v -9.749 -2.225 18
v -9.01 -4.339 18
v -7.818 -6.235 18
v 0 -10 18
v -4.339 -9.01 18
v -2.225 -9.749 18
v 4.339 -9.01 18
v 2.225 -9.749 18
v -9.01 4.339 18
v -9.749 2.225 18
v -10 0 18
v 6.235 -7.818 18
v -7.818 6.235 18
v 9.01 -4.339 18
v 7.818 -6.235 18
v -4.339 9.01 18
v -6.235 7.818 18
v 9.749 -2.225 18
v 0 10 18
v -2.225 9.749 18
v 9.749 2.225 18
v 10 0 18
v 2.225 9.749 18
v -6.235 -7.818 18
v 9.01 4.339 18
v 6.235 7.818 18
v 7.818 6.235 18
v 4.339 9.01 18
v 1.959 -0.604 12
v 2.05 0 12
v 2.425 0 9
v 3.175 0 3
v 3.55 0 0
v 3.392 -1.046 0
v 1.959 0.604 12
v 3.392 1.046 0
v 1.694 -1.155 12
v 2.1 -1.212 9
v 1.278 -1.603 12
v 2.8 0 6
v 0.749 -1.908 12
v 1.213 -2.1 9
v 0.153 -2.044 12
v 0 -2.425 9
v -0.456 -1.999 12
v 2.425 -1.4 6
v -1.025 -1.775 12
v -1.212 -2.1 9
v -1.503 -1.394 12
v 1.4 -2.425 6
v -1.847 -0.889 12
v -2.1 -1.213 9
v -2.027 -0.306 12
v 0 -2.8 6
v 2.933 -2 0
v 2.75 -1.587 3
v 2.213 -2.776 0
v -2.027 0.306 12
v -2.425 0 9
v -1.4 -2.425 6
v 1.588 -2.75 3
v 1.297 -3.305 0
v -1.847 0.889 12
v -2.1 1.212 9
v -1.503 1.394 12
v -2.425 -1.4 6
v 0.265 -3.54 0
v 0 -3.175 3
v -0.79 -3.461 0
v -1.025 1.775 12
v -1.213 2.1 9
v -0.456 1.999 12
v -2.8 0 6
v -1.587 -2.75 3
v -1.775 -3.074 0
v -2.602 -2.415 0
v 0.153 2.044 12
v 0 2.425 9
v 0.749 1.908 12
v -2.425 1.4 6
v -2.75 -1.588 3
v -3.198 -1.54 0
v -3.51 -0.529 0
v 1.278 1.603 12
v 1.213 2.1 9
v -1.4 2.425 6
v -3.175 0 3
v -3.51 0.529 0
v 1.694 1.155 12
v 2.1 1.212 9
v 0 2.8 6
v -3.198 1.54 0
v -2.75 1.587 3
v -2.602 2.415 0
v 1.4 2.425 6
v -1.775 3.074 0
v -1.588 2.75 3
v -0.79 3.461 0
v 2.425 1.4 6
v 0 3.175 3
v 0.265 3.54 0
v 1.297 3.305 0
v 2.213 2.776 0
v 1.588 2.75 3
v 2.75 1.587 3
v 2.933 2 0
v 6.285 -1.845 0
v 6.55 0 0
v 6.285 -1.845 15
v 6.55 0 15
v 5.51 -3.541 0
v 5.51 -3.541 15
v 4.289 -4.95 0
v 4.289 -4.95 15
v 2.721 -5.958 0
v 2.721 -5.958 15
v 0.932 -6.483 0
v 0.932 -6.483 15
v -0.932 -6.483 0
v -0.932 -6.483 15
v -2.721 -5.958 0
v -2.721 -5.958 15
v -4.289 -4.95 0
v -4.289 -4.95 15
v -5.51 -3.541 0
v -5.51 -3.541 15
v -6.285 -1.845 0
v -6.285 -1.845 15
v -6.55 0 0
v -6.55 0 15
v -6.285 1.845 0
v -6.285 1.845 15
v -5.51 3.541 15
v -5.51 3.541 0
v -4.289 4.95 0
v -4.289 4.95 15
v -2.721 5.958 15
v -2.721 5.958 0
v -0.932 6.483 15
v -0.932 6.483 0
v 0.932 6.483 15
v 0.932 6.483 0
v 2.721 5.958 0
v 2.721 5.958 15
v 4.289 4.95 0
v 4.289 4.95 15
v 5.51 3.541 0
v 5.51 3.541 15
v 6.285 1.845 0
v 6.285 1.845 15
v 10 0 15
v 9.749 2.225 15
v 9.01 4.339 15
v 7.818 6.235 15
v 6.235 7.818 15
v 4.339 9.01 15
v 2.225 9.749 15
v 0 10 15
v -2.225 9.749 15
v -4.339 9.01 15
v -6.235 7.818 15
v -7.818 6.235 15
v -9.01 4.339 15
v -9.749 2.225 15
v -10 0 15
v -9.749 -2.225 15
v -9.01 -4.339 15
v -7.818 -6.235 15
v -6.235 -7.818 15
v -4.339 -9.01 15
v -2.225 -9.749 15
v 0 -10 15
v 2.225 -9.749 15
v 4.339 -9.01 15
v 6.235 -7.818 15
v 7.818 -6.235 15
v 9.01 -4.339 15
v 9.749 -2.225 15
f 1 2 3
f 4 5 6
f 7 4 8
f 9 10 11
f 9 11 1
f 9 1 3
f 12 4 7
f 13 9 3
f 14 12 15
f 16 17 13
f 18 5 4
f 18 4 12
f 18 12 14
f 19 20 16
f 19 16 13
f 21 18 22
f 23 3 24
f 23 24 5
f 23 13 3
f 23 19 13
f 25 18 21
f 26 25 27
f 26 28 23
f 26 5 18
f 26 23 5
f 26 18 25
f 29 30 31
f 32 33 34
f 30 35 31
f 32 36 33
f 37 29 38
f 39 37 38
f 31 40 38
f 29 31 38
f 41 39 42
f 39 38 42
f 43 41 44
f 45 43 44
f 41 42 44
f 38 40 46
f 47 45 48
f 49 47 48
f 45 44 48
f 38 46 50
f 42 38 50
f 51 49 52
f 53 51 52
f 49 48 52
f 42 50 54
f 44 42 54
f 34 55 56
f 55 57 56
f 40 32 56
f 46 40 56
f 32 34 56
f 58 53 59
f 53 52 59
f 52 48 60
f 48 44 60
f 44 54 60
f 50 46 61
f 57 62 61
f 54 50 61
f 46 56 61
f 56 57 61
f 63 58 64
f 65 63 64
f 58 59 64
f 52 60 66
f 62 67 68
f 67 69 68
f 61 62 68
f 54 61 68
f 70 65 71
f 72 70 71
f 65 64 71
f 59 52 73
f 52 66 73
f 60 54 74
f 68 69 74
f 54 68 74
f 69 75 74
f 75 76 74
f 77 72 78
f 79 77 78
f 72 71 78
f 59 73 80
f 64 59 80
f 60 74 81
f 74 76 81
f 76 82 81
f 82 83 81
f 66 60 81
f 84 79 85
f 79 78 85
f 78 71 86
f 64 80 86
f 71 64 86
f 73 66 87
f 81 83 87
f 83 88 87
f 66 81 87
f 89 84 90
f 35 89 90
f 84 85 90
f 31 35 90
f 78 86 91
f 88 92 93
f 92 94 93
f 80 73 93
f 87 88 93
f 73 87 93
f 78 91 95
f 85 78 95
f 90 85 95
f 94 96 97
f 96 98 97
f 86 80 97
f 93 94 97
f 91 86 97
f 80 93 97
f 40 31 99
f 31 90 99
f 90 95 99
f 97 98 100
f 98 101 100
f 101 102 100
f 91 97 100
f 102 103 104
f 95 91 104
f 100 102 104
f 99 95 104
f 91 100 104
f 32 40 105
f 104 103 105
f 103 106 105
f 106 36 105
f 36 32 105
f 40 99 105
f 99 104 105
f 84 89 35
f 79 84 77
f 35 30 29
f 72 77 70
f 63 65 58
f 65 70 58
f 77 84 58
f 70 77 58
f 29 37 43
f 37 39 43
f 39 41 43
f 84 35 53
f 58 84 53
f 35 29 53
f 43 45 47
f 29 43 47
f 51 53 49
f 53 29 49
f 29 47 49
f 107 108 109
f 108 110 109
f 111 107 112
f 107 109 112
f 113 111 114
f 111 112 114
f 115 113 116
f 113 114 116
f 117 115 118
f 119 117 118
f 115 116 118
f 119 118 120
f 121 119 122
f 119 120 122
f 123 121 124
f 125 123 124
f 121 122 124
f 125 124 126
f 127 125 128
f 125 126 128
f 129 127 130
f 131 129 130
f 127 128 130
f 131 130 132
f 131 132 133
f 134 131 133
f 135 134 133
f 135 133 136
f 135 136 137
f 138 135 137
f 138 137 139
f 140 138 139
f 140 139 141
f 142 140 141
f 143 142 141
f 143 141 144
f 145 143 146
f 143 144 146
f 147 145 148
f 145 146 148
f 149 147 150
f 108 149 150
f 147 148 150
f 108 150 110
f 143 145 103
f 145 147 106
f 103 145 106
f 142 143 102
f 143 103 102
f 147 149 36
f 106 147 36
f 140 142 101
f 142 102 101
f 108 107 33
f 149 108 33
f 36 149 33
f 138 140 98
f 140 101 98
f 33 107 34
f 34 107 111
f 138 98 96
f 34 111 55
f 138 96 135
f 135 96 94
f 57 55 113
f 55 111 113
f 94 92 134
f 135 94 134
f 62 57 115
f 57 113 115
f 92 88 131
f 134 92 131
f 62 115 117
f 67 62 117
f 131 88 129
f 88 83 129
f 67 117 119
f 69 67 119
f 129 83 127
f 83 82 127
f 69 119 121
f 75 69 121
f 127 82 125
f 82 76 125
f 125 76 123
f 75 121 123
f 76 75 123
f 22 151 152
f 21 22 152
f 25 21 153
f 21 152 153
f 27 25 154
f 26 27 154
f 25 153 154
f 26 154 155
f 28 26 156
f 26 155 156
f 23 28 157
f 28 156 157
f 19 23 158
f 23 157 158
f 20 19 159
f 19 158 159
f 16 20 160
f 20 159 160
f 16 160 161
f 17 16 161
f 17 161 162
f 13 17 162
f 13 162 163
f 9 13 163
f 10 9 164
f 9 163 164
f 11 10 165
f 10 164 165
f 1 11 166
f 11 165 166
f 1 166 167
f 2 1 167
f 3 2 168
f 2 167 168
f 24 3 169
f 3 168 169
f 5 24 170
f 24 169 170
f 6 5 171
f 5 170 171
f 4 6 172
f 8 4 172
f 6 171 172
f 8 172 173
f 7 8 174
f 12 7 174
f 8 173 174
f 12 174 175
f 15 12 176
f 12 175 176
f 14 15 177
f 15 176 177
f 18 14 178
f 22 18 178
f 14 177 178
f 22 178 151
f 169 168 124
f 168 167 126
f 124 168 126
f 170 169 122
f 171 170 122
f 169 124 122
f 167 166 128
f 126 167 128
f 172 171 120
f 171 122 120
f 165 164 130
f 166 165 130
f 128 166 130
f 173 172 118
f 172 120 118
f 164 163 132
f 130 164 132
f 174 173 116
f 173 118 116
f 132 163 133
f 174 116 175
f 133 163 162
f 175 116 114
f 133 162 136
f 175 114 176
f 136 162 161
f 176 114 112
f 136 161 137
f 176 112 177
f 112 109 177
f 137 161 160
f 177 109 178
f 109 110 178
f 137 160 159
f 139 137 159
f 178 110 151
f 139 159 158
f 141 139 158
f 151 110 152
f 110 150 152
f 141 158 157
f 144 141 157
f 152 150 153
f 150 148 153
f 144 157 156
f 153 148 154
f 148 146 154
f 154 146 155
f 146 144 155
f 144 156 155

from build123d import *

# Parameters (mm, degrees)
F2_R     = 10
F3_DEPTH = 3


with BuildPart() as f1:
    # F0 (on Front) → F1 (revolve)
    with BuildSketch(Plane.XZ):
        Polygon((2.05, 12), (3.55, 0), (6.55, 0), (6.55, 15), (0, 15), (0, 12), align=None)
    revolve(axis=Axis((0, 0, 3.882699), (0, 0, -1)))

    # F2 (on face) → F3 (join)
    with BuildSketch(Plane.XY.offset(15)):
        Circle(F2_R)
    extrude(amount=F3_DEPTH)


solid = f1.part
